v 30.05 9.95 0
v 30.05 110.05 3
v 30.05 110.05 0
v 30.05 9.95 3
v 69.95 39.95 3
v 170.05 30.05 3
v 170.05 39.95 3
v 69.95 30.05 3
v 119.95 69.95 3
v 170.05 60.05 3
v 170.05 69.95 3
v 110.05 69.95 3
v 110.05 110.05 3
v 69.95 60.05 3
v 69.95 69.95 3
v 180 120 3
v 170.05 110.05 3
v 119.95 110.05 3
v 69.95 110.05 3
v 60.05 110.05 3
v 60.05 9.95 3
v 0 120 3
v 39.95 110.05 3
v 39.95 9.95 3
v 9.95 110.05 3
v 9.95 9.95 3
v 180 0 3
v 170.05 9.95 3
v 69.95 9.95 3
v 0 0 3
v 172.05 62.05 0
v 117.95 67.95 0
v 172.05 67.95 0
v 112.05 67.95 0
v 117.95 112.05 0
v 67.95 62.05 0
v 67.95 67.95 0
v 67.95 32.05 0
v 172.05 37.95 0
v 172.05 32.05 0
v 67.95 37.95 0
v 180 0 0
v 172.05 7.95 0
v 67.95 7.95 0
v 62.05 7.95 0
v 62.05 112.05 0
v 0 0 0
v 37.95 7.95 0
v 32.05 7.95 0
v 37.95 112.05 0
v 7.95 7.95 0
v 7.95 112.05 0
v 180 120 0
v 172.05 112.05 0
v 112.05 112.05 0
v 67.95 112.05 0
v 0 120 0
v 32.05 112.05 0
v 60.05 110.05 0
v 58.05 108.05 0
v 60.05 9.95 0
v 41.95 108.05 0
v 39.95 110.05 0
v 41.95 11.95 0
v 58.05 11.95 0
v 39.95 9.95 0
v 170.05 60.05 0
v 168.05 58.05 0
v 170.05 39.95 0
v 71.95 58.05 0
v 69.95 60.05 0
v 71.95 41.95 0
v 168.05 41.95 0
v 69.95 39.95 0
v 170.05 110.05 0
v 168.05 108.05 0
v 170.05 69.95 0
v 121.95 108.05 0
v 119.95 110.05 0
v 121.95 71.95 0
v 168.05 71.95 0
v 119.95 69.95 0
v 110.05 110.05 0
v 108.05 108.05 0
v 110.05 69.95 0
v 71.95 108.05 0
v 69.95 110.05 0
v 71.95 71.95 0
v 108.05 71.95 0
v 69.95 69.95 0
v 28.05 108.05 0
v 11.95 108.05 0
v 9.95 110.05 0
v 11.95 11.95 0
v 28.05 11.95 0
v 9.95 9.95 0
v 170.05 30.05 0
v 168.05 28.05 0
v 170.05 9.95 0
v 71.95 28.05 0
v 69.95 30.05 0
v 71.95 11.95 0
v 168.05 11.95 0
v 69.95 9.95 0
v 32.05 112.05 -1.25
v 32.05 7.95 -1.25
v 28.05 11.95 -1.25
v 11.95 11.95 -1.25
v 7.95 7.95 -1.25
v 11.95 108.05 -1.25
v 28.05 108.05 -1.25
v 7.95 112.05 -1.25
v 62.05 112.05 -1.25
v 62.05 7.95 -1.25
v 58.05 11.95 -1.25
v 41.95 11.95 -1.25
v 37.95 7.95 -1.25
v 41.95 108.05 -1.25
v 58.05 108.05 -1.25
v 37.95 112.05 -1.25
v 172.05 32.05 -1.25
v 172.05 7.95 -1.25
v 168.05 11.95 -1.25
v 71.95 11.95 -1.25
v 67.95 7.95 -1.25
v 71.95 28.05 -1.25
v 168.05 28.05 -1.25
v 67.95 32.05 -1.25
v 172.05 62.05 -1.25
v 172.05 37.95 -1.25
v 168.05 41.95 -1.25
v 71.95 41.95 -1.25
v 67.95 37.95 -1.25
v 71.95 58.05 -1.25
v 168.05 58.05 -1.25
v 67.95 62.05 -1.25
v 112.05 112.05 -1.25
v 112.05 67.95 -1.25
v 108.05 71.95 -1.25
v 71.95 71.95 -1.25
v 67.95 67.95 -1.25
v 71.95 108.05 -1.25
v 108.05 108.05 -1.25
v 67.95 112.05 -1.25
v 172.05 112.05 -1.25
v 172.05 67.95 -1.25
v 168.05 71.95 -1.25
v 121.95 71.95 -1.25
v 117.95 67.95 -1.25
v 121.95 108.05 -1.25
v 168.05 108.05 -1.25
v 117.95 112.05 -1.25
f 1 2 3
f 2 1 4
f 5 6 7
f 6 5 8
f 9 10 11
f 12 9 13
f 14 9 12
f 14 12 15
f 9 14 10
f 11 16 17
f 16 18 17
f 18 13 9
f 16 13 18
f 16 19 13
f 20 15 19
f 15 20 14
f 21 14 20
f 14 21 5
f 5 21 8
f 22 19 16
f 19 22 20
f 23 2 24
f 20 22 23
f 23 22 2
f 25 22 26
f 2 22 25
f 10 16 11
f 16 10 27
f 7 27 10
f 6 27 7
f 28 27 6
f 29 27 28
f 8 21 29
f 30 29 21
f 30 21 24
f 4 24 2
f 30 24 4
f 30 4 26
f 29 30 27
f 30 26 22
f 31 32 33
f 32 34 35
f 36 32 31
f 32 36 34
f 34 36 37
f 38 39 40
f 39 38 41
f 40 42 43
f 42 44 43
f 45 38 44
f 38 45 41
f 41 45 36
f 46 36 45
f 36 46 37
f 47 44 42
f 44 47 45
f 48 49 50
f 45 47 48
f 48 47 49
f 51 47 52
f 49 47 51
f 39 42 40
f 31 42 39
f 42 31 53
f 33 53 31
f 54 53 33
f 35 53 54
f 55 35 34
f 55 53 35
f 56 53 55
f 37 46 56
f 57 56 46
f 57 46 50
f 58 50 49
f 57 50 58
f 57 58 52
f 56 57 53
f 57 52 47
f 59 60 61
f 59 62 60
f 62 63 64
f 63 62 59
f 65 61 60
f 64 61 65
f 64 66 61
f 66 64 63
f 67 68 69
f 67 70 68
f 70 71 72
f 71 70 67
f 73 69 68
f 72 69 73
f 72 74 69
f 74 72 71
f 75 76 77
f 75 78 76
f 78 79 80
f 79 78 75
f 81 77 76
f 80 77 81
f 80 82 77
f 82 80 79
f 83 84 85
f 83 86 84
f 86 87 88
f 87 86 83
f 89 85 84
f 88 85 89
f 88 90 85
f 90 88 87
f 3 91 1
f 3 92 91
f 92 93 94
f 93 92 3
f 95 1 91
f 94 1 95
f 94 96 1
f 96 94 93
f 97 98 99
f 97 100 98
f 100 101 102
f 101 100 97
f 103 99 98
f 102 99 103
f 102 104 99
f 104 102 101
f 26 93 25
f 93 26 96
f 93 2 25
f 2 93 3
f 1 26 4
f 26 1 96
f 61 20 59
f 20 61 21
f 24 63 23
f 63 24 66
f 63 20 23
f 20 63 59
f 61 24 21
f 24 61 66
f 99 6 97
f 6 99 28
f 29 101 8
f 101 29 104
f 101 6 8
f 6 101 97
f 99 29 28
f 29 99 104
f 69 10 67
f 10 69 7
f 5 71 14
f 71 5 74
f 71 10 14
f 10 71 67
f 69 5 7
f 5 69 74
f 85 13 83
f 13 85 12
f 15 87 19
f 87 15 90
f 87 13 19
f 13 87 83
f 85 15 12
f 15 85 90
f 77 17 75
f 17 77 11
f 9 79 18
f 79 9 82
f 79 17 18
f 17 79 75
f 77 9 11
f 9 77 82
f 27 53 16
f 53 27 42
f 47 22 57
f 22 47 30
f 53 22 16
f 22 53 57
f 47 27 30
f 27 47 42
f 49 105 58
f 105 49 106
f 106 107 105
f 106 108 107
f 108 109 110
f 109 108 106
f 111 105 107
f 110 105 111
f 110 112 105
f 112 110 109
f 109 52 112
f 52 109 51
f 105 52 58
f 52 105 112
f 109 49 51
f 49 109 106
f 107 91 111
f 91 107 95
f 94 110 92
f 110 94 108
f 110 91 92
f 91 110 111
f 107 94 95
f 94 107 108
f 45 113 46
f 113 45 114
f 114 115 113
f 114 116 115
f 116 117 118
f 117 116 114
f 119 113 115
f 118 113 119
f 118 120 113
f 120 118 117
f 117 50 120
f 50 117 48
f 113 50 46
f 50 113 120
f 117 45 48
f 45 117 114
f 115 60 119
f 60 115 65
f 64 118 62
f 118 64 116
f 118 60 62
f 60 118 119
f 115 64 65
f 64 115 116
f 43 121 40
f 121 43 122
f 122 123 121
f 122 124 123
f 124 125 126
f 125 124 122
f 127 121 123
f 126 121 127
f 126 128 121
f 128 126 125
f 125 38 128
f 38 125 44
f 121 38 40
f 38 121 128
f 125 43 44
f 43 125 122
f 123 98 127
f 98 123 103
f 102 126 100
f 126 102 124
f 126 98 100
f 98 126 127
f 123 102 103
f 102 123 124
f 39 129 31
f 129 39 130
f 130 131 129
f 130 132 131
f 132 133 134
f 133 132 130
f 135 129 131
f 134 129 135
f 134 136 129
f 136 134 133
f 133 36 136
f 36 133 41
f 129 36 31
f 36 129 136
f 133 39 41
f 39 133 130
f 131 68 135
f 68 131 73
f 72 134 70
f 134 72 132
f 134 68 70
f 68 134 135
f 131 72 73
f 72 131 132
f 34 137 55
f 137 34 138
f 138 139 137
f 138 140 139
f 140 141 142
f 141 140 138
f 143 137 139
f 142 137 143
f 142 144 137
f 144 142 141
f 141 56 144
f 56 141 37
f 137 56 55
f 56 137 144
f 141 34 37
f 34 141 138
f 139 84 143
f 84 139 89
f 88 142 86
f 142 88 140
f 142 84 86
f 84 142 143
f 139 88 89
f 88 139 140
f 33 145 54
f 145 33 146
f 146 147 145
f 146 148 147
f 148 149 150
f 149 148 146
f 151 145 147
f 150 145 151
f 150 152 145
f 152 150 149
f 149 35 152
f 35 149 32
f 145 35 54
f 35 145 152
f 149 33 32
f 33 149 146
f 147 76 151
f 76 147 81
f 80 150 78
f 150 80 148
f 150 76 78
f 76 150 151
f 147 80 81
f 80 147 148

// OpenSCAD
/**
 * A top surface which will hold other components in cutouts.
 * This component can be nested
 *
 * @param width        width of the component surface (x-axis)
 * @param length       length of the component surface (y-axis)
 * @param height       height of the component surface (z-axis)
 * @param cutouts      array of cutouts.  each cutout is array with four
                       values: cutout_width, cutout_length, x_offset, y_offset
 */
 module surface(width, length, height, cutouts) {
  cutout_padding = 0.05;

  // a cutout to insert components.
  module cutout(cutout_width, cutout_length, x_offset, y_offset) {
    cutout_width = cutout_width + cutout_padding * 2;
    cutout_length = cutout_length + cutout_padding * 2;
    x_offset = x_offset - cutout_padding;
    y_offset = y_offset - cutout_padding;
    translate([x_offset, y_offset, 0])
      cube([cutout_width, cutout_length, height]);
  }

  // a lip to hold component in place.
  module lip(cutout_width, cutout_length, x_offset, y_offset, lip_width, lip_thickness) {
    cutout_width = cutout_width + cutout_padding * 2;
    cutout_length = cutout_length + cutout_padding * 2;
    x_offset = x_offset - cutout_padding;
    y_offset = y_offset - cutout_padding;
    translate([x_offset, y_offset, -lip_thickness]) {
      difference() {
        translate([-lip_width, -lip_width, 0])
          cube([cutout_width + lip_width * 2, cutout_length + lip_width * 2, lip_thickness]);
        translate([lip_width, lip_width, 0])
          cube([cutout_width - lip_width * 2, cutout_length - lip_width * 2, lip_thickness]);
      }
    }
  }


  difference() {
    cube([width, length, height]);
    for (c = cutouts) {
      cutout(c[0], c[1], c[2], c[3]);
    }
  }

  for (c = cutouts) {
    lip(c[0], c[1], c[2], c[3], 2, 1.25);
  }
}

// Test the component
width = 180;
length = 120;
thickness = 3;

cutouts = [
  [20, 100, 10, 10],
  [20, 100, 40, 10],
  [100, 20, 70, 10],
  [100, 20, 70, 40],
  [40, 40, 70, 70],
  [50, 40, 120, 70],
];

surface(width, length, thickness, cutouts);
